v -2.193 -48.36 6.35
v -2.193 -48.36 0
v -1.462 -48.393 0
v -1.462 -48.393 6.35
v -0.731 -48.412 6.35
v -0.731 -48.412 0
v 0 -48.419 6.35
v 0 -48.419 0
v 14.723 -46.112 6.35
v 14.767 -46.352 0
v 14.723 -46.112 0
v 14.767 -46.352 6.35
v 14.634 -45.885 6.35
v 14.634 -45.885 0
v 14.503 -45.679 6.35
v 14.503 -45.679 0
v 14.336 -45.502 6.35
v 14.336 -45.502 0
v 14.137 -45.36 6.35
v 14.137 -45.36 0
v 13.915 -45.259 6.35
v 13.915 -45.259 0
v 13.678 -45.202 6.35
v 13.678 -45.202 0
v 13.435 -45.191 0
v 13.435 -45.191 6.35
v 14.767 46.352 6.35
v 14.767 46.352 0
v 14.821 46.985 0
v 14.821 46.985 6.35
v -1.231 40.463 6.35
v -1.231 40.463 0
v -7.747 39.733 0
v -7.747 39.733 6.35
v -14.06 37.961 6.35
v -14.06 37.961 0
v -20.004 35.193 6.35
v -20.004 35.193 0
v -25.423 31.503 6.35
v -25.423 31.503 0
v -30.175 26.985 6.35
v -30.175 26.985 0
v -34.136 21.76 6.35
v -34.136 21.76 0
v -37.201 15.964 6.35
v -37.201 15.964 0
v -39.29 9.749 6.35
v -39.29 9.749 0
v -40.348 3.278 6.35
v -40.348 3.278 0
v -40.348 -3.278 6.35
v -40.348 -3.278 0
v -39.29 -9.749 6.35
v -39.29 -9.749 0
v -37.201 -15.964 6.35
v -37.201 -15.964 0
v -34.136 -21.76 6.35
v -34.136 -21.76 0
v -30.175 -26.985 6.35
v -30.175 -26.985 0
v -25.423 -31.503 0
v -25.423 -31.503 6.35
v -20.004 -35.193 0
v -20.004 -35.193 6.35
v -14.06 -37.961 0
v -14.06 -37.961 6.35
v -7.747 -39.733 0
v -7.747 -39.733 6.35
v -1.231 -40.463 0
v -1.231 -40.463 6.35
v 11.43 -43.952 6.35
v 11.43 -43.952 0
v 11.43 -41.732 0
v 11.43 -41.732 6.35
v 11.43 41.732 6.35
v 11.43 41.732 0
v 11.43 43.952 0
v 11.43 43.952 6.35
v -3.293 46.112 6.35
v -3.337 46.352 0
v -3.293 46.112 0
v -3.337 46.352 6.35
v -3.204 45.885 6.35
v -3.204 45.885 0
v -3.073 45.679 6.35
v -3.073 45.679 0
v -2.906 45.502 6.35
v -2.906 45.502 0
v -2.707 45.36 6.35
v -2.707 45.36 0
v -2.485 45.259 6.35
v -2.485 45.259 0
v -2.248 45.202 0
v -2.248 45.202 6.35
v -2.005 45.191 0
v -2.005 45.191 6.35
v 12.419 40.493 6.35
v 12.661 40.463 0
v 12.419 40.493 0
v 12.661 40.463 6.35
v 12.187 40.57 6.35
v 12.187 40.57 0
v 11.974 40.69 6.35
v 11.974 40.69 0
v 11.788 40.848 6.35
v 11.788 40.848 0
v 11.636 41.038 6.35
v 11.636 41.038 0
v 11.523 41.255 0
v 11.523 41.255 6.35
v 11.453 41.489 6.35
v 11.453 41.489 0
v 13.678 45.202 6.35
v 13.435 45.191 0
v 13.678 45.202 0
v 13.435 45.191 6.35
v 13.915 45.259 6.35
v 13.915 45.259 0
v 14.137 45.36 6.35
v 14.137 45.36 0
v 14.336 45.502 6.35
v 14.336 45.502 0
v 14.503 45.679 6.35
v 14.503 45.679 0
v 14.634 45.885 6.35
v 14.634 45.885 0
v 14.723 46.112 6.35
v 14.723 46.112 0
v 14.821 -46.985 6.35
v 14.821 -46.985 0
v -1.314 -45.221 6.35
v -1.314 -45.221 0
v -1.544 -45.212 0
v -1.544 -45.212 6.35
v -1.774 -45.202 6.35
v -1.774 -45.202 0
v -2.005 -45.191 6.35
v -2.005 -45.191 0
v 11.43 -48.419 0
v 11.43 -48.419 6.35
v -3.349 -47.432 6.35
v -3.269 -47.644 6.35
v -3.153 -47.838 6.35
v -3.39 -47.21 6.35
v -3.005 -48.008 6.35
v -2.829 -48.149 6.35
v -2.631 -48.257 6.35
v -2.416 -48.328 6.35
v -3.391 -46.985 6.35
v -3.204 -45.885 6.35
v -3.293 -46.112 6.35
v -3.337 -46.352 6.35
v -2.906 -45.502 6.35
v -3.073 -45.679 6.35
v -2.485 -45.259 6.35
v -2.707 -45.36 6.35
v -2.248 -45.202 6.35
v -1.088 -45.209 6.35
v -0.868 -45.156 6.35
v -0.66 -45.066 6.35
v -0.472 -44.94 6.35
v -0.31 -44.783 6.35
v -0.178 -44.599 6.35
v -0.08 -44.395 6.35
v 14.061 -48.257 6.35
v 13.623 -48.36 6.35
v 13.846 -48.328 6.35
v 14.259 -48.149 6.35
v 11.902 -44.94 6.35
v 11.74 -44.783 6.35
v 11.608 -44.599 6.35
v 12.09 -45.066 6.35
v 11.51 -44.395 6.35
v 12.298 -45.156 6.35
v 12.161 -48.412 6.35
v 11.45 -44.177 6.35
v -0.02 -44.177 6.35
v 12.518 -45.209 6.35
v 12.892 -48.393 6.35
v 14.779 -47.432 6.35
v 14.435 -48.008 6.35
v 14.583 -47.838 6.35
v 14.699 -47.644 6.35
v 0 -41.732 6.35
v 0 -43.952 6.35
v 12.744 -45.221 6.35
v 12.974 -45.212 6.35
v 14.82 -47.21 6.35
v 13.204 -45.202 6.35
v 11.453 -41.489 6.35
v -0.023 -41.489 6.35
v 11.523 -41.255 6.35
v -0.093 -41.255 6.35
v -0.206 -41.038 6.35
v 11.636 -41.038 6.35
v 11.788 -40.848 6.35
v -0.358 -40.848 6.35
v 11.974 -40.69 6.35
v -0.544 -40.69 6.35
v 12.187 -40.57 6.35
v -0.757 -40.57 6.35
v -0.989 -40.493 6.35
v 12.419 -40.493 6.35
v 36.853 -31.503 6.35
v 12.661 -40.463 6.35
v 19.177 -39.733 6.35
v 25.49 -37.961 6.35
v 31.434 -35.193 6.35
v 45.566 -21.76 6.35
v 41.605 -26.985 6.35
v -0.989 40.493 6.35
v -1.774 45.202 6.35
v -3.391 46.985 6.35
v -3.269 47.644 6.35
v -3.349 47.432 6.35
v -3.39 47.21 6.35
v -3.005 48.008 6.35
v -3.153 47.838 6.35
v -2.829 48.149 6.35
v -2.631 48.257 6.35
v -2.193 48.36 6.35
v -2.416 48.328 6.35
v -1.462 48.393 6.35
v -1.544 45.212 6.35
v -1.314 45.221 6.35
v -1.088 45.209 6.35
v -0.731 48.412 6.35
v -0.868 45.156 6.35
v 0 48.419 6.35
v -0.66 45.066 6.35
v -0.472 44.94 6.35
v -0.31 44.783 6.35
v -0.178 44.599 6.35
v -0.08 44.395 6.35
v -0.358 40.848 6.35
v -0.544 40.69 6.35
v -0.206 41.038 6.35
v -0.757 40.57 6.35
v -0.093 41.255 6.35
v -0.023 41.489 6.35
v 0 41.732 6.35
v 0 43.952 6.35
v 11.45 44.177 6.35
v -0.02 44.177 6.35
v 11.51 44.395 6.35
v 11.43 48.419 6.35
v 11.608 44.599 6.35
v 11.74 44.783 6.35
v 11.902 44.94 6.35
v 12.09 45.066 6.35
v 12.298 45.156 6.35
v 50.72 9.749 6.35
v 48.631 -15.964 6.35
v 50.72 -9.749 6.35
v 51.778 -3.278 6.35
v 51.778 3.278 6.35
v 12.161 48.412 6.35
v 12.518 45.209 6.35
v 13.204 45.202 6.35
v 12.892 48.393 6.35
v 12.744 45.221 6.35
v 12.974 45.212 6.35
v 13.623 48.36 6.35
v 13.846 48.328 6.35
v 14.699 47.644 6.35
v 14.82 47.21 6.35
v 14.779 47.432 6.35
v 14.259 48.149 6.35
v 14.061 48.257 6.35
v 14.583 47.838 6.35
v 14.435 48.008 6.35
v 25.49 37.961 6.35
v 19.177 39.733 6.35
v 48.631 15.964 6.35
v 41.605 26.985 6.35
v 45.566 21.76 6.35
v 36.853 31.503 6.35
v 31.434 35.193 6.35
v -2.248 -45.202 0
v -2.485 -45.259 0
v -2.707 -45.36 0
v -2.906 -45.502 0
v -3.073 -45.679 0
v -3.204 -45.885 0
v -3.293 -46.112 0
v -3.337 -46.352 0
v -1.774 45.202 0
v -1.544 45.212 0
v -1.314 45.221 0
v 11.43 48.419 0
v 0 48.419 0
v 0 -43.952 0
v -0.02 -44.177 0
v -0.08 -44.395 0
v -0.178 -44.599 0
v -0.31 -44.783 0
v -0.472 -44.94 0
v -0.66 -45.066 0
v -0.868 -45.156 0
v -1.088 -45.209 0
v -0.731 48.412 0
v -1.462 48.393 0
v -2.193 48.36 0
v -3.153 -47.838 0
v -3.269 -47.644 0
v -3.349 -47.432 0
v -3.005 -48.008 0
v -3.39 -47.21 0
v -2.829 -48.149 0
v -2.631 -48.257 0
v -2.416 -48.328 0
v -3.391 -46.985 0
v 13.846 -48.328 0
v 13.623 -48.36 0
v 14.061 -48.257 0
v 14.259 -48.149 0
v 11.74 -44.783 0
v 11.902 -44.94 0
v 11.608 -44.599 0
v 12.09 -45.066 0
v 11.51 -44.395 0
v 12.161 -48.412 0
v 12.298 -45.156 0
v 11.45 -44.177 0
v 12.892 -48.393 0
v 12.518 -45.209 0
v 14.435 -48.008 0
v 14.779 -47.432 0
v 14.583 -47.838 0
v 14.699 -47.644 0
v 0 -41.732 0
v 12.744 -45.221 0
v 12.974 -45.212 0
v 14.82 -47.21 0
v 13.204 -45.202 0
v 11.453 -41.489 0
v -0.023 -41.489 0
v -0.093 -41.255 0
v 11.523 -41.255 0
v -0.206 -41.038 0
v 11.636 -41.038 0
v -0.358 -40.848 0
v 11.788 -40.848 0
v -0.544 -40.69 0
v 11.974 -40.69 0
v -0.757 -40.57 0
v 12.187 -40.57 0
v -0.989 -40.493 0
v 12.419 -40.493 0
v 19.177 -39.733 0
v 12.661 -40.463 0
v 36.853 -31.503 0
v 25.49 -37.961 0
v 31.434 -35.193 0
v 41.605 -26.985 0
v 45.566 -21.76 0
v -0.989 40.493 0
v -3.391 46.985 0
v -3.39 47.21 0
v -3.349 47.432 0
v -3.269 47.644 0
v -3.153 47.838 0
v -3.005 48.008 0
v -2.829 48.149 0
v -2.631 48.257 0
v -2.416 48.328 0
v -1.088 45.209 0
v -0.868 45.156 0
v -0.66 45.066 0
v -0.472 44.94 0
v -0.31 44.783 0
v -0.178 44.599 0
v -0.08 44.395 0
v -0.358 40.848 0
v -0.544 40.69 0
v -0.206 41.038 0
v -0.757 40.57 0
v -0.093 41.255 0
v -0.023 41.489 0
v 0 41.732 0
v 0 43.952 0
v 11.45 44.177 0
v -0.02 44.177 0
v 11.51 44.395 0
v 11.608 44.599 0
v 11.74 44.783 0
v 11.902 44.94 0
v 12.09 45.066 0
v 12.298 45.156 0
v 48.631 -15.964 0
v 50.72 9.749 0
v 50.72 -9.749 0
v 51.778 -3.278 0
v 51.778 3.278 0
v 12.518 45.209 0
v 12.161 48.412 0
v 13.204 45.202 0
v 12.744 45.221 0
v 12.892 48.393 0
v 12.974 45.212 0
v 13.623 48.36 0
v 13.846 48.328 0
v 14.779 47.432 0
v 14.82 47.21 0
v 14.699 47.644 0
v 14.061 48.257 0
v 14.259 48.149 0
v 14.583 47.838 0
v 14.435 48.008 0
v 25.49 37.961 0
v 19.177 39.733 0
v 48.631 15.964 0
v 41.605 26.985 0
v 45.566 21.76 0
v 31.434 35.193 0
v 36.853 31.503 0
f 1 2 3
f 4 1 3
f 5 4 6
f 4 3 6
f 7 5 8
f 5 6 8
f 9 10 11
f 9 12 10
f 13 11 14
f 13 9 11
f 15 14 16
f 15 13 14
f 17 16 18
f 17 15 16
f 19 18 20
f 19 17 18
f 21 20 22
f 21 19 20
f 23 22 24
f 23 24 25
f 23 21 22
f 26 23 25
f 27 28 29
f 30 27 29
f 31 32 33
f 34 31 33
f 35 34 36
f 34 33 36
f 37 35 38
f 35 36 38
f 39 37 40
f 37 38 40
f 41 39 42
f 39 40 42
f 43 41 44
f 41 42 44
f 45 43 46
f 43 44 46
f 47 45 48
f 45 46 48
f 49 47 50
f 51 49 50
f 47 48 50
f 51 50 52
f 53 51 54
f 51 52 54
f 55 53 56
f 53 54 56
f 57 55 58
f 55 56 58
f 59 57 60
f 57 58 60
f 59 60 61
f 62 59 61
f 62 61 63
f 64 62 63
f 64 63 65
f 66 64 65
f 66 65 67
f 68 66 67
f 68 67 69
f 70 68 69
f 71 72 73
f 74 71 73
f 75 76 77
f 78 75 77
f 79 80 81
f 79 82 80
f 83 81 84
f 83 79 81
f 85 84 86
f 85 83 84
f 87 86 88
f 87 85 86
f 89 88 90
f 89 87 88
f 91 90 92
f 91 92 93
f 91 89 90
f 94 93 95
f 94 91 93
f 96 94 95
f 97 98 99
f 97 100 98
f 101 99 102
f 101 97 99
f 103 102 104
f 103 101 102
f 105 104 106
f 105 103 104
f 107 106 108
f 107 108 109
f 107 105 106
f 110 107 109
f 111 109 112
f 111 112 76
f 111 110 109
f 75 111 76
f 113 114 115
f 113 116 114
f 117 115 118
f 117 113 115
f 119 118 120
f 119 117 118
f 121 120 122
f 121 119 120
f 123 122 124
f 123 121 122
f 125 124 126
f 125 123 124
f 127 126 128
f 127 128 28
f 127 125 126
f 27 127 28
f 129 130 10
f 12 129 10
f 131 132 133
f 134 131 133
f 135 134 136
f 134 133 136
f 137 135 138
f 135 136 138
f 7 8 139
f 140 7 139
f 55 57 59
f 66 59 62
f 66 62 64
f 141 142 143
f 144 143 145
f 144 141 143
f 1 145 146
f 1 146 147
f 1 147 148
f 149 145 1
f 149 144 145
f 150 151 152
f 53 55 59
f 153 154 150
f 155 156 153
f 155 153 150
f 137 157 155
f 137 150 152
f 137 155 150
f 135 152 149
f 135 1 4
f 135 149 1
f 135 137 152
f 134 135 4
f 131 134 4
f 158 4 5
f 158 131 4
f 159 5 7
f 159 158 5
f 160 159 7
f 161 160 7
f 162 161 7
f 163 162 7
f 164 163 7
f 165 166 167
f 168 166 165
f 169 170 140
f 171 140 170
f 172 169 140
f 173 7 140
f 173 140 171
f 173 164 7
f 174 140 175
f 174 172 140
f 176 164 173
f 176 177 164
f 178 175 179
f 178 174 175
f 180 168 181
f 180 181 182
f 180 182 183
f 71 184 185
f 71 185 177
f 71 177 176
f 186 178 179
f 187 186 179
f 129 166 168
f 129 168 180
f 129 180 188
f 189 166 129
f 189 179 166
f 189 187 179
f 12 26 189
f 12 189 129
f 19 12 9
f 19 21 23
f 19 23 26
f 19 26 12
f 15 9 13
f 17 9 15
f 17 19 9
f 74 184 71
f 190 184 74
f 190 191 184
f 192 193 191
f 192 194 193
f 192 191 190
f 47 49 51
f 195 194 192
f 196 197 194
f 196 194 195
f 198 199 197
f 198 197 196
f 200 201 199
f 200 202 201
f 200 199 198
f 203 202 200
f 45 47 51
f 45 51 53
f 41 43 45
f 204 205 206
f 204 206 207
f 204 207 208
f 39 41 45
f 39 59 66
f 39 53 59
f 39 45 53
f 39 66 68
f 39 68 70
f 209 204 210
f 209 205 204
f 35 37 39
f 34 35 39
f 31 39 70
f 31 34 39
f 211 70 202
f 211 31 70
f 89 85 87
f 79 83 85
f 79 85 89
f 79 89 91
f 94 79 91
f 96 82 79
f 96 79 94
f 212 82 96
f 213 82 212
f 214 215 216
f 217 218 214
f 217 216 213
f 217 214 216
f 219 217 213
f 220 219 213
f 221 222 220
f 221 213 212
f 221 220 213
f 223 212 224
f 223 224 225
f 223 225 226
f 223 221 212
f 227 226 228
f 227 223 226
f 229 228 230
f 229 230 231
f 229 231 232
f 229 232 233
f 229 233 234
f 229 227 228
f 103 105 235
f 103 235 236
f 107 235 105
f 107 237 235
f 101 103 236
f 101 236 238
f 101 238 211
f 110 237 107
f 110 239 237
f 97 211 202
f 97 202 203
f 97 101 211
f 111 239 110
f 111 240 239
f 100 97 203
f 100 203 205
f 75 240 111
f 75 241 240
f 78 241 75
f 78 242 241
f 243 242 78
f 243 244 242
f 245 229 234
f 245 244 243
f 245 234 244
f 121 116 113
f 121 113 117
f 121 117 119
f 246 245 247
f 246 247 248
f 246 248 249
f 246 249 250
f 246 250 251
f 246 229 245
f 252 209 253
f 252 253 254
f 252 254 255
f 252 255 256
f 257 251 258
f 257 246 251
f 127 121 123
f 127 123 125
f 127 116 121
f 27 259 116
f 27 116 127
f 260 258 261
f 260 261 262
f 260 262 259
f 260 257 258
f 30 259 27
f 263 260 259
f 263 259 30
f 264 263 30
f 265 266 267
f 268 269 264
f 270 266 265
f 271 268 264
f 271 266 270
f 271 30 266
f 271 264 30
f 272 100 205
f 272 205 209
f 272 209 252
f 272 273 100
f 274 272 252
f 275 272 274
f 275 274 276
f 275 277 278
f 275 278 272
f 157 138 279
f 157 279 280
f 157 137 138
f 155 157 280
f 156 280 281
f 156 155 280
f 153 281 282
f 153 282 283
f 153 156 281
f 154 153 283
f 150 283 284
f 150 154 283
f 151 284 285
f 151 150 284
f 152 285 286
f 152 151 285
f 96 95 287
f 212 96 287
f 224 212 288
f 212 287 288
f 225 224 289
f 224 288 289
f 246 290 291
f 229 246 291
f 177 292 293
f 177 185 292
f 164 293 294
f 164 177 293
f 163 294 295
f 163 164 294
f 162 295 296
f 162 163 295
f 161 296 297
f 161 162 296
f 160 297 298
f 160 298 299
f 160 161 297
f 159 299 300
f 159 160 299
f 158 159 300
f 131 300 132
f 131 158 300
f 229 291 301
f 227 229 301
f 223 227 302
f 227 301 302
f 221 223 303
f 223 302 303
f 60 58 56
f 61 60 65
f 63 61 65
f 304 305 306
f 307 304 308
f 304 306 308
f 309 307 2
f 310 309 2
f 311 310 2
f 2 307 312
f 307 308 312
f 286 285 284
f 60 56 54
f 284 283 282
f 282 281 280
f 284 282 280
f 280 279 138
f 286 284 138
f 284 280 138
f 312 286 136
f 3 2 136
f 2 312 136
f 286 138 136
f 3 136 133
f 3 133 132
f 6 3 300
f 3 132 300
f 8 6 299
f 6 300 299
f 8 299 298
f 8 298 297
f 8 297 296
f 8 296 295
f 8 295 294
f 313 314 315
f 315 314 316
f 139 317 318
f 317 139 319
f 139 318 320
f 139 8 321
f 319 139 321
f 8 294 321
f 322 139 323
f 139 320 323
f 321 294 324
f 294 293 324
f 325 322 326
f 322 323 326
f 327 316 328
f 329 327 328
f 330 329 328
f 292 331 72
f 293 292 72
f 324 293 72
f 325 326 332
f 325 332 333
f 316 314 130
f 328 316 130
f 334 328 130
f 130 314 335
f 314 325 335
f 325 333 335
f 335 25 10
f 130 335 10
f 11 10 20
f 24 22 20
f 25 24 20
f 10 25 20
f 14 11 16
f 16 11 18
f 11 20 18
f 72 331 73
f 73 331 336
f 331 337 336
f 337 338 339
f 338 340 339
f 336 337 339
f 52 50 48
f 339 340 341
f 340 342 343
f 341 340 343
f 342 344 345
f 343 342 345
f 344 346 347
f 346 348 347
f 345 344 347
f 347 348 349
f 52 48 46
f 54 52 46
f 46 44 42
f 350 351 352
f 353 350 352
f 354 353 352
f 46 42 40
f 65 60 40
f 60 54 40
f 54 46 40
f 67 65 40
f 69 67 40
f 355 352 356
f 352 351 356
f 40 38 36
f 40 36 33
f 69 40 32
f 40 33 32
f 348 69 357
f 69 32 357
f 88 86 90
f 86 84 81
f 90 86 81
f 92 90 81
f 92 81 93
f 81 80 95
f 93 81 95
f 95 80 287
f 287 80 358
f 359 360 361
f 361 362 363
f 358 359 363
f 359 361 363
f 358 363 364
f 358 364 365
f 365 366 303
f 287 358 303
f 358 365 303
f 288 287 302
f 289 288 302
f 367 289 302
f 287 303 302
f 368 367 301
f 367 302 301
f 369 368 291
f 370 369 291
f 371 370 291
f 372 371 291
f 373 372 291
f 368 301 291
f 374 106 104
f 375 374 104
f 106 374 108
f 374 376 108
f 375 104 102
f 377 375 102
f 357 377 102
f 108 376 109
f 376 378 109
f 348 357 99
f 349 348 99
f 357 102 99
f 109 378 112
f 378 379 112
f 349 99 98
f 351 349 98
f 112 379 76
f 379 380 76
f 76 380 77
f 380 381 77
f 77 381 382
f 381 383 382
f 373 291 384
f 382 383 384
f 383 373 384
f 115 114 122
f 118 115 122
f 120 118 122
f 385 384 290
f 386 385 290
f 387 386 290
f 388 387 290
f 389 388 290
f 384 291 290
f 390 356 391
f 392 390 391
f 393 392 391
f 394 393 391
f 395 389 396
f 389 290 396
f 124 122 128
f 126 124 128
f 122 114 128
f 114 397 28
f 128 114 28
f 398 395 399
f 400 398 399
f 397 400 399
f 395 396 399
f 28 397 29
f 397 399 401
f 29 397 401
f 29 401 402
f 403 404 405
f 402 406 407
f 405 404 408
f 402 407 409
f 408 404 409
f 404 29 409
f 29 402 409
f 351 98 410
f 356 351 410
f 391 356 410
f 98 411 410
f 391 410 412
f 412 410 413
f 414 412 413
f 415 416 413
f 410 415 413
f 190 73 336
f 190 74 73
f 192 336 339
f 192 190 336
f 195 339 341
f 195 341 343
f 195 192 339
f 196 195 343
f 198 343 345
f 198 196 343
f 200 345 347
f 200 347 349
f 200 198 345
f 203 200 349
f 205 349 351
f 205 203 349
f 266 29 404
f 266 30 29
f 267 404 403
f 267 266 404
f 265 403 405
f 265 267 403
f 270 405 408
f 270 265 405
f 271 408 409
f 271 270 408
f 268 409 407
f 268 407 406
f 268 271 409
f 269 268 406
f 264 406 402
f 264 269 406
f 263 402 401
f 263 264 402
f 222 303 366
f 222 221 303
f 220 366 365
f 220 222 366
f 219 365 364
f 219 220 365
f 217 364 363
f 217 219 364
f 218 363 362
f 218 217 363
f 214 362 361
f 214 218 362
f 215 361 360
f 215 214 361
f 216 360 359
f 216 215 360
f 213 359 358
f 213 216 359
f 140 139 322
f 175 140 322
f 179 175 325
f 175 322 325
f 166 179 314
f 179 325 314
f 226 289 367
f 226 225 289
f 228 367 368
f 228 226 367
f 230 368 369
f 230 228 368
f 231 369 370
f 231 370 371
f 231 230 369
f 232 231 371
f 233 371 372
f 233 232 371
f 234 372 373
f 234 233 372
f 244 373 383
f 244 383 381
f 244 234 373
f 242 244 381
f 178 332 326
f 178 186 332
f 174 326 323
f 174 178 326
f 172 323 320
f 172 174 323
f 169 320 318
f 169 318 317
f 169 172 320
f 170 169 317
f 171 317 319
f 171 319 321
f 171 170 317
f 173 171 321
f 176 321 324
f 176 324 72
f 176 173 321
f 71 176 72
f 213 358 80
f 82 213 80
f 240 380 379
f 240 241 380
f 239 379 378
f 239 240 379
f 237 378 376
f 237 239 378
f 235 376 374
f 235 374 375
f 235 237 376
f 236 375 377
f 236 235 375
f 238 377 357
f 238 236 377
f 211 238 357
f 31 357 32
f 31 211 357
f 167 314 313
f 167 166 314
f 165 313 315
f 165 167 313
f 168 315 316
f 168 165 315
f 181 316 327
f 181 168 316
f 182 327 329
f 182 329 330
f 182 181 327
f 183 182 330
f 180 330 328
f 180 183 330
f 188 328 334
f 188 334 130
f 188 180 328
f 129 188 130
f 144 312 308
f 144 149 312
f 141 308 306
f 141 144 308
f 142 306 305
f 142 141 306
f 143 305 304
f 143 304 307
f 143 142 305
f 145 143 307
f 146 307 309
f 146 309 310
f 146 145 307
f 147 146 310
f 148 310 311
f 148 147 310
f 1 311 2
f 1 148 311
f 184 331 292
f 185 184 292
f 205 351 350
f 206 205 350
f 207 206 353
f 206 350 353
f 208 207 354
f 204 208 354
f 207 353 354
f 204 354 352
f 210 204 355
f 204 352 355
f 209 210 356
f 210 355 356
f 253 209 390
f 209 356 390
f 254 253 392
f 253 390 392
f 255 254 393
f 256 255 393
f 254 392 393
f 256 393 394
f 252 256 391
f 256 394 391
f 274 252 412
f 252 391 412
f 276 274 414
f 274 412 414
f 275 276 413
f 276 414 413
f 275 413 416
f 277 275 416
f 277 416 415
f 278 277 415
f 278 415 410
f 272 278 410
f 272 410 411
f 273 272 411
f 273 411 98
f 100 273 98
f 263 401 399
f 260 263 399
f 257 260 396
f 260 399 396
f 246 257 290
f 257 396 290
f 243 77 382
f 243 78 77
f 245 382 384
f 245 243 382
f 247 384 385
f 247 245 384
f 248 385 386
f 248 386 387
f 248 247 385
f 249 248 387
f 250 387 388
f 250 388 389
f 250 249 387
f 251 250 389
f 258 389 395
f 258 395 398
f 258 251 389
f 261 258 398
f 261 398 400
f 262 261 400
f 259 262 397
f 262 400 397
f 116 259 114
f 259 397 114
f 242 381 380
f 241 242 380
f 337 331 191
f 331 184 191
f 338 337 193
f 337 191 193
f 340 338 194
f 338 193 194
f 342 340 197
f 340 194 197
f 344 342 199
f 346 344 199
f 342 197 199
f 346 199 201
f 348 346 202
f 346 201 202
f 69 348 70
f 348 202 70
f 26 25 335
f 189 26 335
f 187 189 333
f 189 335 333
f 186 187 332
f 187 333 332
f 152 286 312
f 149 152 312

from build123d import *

# Parameters (mm, degrees)
F1_DEPTH = 6.35
F2_R     = 1.27


with BuildPart() as f1:
    # F0 (on Top) → F1 (new body)
    with BuildSketch(Plane.XY):
        with BuildLine():
            Line((0, -40.48125), (0, -41.275))
            Line((0, -41.275), (0, -41.28198))
            Line((0, -41.28198), (0, -45.24375))
            ThreePointArc((0, -45.24375), (-1.616893, -45.209426), (-3.230874, -45.106514))
            Line((-3.230874, -45.106514), (-3.500113, -48.270078))
            ThreePointArc((-3.500113, -48.270078), (-1.751635, -48.381565), (0, -48.41875))
            Line((0, -48.41875), (11.43, -48.41875))
            ThreePointArc((11.43, -48.41875), (13.181635, -48.381565), (14.930113, -48.270078))
            Line((14.930113, -48.270078), (14.660874, -45.106514))
            ThreePointArc((14.660874, -45.106514), (13.046893, -45.209426), (11.43, -45.24375))
            Line((11.43, -45.24375), (11.43, -40.48125))
            ThreePointArc((11.43, -40.48125), (51.91125, 0), (11.43, 40.48125))
            Line((11.43, 40.48125), (11.43, 45.24375))
            ThreePointArc((11.43, 45.24375), (13.046893, 45.209426), (14.660874, 45.106514))
            Line((14.660874, 45.106514), (14.930113, 48.270078))
            ThreePointArc((14.930113, 48.270078), (13.181635, 48.381565), (11.43, 48.41875))
            Line((11.43, 48.41875), (0, 48.41875))
            ThreePointArc((0, 48.41875), (-1.751635, 48.381565), (-3.500113, 48.270078))
            Line((-3.500113, 48.270078), (-3.230874, 45.106514))
            ThreePointArc((-3.230874, 45.106514), (-1.616893, 45.209426), (0, 45.24375))
            Line((0, 45.24375), (0, 41.275))
            Line((0, 41.275), (0, 41.207306))
            Line((0, 41.207306), (0, 40.48125))
            ThreePointArc((0, 40.48125), (-40.48125, 0), (0, -40.48125))
        make_face()
    extrude(amount=F1_DEPTH)

    # F2
    f2_edges = [f1.edges().sort_by_distance(p)[0] for p in [
        (0, -40.48125, 3.175),
        (11.43, -40.48125, 3.175),
        (14.930113, -48.270078, 3.175),
        (14.660874, -45.106514, 3.175),
        (-3.500113, -48.270078, 3.175),
        (-3.230874, -45.106514, 3.175),
        (14.660874, 45.106514, 3.175),
        (14.930113, 48.270078, 3.175),
        (-3.500113, 48.270078, 3.175),
        (-3.230874, 45.106514, 3.175),
        (0, 45.24375, 3.175),
        (0, 40.48125, 3.175),
        (11.43, -45.24375, 3.175),
        (0, -45.24375, 3.175),
        (11.43, 40.48125, 3.175),
        (11.43, 45.24375, 3.175),
    ]]
    fillet(f2_edges, radius=F2_R)


solid = f1.part
